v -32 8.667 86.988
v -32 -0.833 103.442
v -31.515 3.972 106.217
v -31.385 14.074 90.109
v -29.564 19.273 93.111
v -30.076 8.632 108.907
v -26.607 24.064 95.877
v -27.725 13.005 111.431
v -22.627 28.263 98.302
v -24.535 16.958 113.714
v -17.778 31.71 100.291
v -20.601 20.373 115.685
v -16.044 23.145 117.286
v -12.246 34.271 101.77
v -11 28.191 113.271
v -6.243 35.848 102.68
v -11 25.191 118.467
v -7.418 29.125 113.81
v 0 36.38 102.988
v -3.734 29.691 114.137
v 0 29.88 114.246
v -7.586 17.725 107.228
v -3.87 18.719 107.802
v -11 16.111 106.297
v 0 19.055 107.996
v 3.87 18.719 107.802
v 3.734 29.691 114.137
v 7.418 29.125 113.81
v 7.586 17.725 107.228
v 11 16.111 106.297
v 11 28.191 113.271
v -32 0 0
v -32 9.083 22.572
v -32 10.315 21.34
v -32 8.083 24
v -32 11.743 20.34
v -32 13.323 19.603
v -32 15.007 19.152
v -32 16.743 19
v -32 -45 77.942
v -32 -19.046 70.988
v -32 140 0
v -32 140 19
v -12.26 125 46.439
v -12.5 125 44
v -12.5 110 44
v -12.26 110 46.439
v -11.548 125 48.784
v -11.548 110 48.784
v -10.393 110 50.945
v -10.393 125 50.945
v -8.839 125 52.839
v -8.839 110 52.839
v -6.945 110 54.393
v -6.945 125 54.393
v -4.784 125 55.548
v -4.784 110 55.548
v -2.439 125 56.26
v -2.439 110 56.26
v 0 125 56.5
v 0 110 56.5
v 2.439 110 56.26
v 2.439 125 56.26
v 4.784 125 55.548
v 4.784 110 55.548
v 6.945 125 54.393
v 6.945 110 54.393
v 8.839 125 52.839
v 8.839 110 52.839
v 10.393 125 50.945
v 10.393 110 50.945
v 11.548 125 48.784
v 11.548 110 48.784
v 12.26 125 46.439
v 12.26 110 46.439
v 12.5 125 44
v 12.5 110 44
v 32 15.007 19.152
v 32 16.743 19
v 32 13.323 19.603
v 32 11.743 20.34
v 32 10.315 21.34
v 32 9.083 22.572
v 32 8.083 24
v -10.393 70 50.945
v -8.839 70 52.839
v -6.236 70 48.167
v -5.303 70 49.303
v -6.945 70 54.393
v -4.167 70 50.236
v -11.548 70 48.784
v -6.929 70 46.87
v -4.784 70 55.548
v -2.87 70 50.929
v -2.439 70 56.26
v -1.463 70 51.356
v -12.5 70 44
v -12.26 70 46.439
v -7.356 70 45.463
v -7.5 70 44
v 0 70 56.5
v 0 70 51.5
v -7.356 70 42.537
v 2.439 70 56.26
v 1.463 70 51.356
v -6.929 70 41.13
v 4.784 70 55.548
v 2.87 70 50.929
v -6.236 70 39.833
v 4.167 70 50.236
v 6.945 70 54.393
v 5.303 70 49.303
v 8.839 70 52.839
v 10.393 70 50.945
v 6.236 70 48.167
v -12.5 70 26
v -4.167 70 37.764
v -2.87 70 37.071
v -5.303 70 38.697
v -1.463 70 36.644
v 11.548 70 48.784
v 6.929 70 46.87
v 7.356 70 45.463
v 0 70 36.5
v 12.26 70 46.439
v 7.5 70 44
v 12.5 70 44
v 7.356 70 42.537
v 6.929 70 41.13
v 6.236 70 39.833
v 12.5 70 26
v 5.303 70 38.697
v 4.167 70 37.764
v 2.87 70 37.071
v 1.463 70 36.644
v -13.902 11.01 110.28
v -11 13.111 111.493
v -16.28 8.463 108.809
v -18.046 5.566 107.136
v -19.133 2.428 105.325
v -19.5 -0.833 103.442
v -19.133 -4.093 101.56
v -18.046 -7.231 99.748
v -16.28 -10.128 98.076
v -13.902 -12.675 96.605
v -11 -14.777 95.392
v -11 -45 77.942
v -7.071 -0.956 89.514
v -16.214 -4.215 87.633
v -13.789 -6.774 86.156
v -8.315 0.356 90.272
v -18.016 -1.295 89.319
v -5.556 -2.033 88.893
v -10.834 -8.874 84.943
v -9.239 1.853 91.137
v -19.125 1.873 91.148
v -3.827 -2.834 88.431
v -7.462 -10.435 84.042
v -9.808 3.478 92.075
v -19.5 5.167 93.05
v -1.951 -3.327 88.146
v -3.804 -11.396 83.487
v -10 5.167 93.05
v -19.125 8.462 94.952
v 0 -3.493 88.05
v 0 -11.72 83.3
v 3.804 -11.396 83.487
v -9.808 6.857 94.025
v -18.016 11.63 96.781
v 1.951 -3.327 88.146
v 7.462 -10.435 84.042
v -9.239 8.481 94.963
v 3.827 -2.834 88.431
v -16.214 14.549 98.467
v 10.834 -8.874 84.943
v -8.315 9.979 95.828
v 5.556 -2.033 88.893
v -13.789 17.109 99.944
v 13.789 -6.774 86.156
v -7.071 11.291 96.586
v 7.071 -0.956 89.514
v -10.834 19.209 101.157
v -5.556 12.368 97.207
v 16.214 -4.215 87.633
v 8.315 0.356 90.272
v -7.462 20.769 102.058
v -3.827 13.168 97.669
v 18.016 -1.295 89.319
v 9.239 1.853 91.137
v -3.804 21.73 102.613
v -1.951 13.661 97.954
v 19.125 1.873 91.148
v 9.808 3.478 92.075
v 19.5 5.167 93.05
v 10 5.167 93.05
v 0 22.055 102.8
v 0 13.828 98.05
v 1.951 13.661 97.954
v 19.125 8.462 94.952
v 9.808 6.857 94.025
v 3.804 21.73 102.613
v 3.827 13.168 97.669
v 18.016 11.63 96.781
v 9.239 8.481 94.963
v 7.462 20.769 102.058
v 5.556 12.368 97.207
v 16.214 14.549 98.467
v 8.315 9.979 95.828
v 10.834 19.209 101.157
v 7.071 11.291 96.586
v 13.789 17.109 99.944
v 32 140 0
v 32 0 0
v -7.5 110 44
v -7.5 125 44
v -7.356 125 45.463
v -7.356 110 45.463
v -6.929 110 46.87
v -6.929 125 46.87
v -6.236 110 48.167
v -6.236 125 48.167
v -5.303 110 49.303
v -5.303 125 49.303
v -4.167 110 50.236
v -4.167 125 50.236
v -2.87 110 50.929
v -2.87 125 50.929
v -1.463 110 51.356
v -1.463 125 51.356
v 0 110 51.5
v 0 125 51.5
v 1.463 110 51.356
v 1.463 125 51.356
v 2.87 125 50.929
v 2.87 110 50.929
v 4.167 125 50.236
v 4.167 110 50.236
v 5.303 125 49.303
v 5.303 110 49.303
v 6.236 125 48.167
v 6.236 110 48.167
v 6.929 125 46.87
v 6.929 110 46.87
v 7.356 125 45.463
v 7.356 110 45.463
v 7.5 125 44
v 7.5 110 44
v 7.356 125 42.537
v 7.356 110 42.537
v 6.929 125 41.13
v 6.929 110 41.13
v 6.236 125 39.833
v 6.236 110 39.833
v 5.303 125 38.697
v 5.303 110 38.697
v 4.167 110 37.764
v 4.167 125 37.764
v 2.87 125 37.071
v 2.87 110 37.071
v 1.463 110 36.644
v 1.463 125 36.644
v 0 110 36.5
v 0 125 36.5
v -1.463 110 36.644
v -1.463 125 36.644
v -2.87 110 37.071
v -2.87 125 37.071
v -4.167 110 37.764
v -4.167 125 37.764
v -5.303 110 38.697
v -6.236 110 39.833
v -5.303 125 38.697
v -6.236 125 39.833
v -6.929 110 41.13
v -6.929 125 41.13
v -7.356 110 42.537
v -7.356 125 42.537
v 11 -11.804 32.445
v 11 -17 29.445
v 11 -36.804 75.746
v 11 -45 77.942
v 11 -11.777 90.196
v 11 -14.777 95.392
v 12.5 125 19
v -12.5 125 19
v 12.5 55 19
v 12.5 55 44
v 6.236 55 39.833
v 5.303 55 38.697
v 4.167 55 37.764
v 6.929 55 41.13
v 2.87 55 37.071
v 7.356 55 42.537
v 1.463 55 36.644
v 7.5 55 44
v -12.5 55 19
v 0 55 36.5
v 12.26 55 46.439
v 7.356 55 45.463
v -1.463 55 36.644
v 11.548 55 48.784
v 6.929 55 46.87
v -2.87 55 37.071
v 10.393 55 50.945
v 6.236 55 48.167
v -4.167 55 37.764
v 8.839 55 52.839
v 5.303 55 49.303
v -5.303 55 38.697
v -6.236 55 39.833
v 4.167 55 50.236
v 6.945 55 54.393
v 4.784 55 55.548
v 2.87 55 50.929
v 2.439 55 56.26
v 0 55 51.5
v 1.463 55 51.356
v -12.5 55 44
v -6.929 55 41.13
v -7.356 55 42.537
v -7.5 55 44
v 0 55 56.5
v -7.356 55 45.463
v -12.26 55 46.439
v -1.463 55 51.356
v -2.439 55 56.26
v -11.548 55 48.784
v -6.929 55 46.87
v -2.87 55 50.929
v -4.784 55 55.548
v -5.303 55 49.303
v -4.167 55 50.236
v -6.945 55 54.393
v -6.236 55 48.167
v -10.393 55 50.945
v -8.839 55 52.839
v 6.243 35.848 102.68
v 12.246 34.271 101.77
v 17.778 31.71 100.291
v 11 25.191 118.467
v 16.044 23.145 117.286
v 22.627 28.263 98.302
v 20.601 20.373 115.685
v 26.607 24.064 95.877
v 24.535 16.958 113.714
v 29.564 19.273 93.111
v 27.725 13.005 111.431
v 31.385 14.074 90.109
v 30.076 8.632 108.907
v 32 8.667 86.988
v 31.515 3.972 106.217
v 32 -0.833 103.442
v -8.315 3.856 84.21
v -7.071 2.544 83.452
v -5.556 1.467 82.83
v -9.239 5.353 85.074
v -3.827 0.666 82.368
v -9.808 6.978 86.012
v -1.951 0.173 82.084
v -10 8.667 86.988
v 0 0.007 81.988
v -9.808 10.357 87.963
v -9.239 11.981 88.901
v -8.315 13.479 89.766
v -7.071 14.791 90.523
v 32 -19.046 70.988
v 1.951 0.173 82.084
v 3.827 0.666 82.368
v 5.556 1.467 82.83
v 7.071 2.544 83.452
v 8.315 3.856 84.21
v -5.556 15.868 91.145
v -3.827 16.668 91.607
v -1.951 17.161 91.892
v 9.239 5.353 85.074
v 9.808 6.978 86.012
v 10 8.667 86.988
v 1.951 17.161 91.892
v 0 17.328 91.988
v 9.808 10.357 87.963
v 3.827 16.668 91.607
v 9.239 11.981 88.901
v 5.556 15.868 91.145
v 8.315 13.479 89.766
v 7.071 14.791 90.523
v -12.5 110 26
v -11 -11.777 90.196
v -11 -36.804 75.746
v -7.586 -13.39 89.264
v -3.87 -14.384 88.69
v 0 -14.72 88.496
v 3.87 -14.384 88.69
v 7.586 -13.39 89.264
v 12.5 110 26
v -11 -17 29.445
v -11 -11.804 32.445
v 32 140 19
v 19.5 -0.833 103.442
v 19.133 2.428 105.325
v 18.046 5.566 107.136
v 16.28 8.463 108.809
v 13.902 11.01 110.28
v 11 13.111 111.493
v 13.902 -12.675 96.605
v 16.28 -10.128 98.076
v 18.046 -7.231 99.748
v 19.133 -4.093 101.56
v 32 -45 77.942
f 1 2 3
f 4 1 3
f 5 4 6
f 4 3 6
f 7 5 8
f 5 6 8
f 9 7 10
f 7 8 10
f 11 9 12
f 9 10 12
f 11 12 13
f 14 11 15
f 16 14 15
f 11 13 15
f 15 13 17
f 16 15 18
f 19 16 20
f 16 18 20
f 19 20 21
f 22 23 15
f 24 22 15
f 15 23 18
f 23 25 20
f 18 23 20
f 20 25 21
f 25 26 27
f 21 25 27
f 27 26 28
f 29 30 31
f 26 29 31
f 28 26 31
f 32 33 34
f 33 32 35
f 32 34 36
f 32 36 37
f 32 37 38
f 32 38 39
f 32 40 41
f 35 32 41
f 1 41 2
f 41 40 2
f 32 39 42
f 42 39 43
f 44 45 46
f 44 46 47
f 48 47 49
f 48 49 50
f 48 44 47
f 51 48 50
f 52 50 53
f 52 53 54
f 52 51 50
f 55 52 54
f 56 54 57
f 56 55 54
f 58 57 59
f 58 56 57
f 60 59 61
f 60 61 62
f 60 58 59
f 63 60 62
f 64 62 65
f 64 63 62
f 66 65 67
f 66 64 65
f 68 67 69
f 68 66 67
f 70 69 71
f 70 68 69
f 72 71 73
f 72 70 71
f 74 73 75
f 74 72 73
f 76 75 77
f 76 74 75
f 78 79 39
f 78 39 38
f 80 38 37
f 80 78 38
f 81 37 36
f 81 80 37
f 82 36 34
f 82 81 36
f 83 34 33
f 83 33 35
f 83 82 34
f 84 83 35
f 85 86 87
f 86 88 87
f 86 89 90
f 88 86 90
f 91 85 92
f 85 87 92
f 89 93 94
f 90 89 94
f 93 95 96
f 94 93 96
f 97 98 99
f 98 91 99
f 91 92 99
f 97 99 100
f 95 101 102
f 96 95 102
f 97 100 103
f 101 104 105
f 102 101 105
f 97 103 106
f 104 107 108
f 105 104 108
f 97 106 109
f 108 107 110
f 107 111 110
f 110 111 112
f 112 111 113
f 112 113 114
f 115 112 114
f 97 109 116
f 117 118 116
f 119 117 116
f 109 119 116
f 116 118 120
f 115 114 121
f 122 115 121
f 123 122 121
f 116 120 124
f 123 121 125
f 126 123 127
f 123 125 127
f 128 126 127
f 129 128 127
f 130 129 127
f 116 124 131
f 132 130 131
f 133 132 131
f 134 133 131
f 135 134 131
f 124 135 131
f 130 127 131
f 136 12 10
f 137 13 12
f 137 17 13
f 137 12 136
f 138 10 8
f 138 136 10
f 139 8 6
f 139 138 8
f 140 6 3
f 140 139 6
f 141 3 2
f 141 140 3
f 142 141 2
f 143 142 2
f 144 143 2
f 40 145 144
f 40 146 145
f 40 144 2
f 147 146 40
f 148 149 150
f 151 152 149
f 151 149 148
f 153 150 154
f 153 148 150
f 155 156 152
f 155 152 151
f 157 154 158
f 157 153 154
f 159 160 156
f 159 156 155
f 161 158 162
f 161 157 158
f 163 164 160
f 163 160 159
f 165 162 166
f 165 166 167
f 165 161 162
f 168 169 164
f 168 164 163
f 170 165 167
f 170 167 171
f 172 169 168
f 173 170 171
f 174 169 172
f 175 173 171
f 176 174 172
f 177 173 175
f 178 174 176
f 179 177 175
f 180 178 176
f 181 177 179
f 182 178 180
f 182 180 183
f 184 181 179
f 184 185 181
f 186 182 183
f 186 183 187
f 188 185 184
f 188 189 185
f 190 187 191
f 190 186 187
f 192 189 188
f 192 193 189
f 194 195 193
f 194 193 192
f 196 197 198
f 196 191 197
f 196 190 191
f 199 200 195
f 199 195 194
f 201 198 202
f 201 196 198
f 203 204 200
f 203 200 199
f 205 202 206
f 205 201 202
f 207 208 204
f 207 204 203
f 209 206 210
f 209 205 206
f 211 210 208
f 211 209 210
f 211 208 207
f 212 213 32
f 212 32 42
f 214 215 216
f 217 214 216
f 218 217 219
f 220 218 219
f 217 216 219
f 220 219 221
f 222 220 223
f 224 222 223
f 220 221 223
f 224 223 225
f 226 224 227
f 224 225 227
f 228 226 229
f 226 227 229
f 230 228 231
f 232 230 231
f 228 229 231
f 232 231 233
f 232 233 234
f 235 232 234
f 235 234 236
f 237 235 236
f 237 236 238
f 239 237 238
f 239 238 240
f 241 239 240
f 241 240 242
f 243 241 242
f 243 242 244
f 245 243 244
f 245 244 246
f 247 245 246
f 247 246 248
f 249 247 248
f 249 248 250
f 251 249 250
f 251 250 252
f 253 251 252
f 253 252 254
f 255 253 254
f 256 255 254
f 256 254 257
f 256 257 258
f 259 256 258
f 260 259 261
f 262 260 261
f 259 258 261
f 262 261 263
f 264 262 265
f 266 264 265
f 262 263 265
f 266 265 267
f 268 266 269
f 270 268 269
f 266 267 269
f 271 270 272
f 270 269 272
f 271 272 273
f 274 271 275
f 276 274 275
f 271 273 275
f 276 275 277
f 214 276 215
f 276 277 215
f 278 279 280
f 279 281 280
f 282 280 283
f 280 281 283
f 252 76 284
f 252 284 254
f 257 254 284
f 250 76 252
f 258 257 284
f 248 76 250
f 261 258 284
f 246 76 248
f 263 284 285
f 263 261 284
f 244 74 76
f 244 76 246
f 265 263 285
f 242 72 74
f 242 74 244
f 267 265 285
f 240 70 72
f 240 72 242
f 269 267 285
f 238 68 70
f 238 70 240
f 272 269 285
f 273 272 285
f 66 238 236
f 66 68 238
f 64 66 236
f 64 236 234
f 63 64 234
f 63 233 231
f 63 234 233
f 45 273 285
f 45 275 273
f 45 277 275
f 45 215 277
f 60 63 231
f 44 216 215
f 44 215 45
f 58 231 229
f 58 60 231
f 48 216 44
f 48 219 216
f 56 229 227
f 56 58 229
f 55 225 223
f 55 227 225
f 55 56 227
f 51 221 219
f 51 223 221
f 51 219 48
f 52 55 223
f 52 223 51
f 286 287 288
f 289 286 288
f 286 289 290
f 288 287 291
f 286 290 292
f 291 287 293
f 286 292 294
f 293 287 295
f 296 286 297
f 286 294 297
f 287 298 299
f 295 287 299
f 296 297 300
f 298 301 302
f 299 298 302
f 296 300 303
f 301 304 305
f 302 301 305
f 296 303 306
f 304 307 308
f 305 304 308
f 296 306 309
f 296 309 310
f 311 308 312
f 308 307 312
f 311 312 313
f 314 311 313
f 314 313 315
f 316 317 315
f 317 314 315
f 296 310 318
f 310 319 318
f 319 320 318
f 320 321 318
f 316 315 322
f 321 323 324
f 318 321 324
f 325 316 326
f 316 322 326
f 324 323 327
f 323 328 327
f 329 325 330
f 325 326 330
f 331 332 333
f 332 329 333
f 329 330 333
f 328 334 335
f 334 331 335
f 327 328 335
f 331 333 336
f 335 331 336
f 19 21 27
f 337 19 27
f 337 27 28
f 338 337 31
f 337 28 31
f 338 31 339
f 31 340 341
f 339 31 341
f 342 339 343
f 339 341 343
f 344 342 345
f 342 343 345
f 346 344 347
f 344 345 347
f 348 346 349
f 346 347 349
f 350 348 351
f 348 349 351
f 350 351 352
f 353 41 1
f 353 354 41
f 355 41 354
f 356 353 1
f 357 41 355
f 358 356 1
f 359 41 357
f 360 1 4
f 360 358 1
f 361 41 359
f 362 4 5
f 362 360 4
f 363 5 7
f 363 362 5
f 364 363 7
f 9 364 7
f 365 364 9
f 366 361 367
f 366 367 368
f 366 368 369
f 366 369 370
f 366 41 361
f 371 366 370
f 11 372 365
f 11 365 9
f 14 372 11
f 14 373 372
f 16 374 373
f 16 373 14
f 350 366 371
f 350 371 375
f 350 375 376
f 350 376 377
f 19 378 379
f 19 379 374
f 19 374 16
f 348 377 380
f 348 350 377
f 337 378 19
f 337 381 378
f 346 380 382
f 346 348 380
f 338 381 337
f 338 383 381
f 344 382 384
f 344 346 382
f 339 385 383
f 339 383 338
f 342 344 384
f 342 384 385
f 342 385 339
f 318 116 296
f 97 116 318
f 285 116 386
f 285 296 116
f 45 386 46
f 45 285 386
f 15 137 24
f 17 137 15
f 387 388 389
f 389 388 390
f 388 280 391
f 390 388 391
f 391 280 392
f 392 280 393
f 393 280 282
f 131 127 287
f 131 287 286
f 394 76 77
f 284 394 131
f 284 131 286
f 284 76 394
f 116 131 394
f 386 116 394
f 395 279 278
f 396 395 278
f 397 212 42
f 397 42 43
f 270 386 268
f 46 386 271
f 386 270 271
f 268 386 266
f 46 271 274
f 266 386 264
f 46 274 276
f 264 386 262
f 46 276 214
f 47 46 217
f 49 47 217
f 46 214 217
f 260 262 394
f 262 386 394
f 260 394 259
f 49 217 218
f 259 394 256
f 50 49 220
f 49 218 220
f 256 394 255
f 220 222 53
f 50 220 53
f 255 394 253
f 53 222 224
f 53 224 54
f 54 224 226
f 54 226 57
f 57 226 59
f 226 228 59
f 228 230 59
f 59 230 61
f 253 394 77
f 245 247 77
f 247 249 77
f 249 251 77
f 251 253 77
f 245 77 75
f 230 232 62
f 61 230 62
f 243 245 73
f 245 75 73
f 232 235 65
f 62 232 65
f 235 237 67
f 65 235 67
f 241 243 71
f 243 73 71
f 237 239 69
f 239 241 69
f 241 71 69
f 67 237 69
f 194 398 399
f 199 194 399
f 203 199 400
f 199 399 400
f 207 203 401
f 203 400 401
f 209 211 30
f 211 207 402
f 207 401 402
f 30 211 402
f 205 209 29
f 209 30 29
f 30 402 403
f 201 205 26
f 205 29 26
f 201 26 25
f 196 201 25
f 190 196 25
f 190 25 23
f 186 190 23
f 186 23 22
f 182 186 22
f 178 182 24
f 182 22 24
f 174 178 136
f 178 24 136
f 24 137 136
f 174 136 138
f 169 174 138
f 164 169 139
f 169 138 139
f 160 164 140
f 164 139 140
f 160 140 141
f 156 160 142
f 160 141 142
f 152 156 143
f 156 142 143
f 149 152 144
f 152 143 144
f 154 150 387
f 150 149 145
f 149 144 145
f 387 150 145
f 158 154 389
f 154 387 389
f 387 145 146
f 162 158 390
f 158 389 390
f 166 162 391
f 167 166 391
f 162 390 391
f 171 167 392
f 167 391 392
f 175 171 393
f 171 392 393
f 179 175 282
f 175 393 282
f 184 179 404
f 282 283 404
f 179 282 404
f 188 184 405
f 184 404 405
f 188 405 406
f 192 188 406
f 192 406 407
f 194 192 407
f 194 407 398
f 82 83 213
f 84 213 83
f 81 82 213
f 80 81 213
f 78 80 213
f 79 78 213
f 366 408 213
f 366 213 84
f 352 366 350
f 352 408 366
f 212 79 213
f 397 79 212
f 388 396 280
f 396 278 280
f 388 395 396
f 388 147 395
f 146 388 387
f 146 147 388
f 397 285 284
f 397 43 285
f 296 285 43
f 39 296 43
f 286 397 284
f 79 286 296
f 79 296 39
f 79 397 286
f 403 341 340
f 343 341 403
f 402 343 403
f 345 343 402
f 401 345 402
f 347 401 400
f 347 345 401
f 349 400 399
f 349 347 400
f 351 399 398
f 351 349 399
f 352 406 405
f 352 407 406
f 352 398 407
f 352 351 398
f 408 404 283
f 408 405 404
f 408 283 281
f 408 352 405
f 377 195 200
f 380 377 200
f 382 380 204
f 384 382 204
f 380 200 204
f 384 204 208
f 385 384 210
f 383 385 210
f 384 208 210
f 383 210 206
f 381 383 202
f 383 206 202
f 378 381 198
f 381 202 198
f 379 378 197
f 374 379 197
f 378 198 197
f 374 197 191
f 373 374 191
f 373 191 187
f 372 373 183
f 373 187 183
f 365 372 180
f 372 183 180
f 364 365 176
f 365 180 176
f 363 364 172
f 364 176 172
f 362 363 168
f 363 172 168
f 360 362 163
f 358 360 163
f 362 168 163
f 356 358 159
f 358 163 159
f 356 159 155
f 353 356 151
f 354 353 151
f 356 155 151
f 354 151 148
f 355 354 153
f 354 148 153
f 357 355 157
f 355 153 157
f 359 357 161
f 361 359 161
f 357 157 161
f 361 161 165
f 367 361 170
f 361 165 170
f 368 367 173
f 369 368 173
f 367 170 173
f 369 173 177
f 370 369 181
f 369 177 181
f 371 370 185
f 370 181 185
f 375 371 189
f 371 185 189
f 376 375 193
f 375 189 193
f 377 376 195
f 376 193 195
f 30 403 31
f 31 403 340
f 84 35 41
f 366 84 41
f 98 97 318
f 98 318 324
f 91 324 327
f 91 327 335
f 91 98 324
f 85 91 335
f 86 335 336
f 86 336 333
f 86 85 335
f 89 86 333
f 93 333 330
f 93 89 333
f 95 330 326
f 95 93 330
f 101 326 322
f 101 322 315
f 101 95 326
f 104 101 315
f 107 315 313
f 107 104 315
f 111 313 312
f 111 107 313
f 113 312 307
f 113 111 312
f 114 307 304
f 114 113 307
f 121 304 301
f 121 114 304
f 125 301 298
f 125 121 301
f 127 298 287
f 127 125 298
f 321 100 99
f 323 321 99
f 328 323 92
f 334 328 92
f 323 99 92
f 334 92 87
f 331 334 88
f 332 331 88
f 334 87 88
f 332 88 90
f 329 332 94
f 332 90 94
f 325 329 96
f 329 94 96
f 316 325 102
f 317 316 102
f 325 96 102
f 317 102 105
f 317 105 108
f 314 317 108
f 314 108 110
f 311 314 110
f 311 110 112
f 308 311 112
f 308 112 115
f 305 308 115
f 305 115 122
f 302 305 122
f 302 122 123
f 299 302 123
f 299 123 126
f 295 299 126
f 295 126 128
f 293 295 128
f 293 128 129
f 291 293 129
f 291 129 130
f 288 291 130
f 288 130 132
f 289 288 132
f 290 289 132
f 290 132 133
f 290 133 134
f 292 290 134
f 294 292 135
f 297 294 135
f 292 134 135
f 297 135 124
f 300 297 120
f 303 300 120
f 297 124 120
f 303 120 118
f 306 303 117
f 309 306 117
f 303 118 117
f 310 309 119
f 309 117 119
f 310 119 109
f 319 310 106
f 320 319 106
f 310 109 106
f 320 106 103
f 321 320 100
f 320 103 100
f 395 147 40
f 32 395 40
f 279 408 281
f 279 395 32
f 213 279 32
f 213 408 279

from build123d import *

# Parameters (mm, degrees)
F1_DEPTH  = 32
F3_DEPTH  = 19
F5_DEPTH  = 11
F6_R      = 10
F7_DEPTH  = 25
F8_R      = 19.5
F9_DEPTH  = 12
F11_R     = 7.5
F12_DEPTH = 70
F14_DEPTH = 32


with BuildPart() as f1:
    # F0 (on Right) → F1 (new body, symmetric)
    with BuildSketch(Plane.YZ):
        with BuildLine():
            Line((-45, 77.9422863406), (0, 0))
            Line((0, 0), (140, 0))
            Line((140, 0), (140, 19))
            Line((140, 19), (16.7431578065, 19))
            ThreePointArc((16.7431578065, 19), (11.7431578065, 20.3397459622), (8.0829037687, 24))
            Line((8.0829037687, 24), (-19.0455173281, 70.9878036687))
            Line((-19.0455173281, 70.9878036687), (36.3801085141, 102.9878036687))
            Line((36.3801085141, 102.9878036687), (26.8801085141, 119.4422863406))
            Line((26.8801085141, 119.4422863406), (-45, 77.9422863406))
        make_face()
    extrude(amount=F1_DEPTH, both=True)

    # F2 (on face) → F3 (cut, through all)
    with BuildSketch(Plane(origin=(0, -45, 77.9422863406), x_dir=(1, 0, 0), z_dir=(0, -0.5, 0.8660254038))):
        with BuildLine():
            Line((32, 83), (0, 83))
            ThreePointArc((0, 83), (22.627416998, 73.627416998), (32, 51))
            Line((32, 51), (32, 83))
        make_face()
        with BuildLine():
            Line((-32, 83), (-32, 51))
            ThreePointArc((-32, 51), (-22.627416998, 73.627416998), (0, 83))
            Line((0, 83), (-32, 83))
        make_face()
        Polygon((-106.2661910977, 51), (-32, 51), (-32, 83), (0, 83), (32, 83), (32, 51), (106.2661910977, 51), (106.2661910977, 125.2661910977), (-106.2661910977, 125.2661910977), align=None)
    extrude(amount=-F3_DEPTH, mode=Mode.SUBTRACT)

    # F4 (on Right) → F5 (cut, symmetric)
    with BuildSketch(Plane.YZ):
        Polygon((-36.8038475773, 75.7461339179), (80.5091410398, 143.4768194754), (54.8271117013, 187.9593991312), (-109.3994230032, 93.1431651115), (-58.7173936647, 5.3593152665), (-11.8038475773, 32.4448637287), align=None)
    extrude(amount=F5_DEPTH, both=True, mode=Mode.SUBTRACT)

    # F6 (on face) → F7 (cut, symmetric)
    with BuildSketch(Plane(origin=(0, -42, 72.7461339179), x_dir=(1, 0, 0), z_dir=(0, -0.5, 0.8660254038))):
        with Locations((0, 51)):
            Circle(F6_R)
    extrude(amount=F7_DEPTH, both=True, mode=Mode.SUBTRACT)

    # F8 (on face) → F9 (cut)
    with BuildSketch(Plane(origin=(0, -45, 77.9422863406), x_dir=(1, 0, 0), z_dir=(0, -0.5, 0.8660254038))):
        with Locations((0, 51)):
            Circle(F8_R)
    extrude(amount=-F9_DEPTH, mode=Mode.SUBTRACT)

    # F11 (on offset) → F12 (join)
    with BuildSketch(Plane(origin=(0, 125, 0), x_dir=(-1, 0, 0), z_dir=(0, 1, 0))):
        with BuildLine():
            Line((-12.5, 44), (-12.5, 19))
            Line((-12.5, 19), (12.5, 19))
            Line((12.5, 19), (12.5, 44))
            ThreePointArc((12.5, 44), (0, 56.5), (-12.5, 44))
        make_face()
        with Locations((0, 44)):
            Circle(F11_R, mode=Mode.SUBTRACT)
    extrude(amount=-F12_DEPTH)

    # F13 (on Right) → F14 (cut, symmetric)
    with BuildSketch(Plane.YZ):
        Polygon((110, 97.3418423458), (70, 97.3418423458), (70, 26), (90, 26), (110, 26), align=None)
    extrude(amount=F14_DEPTH, both=True, mode=Mode.SUBTRACT)


solid = f1.part
